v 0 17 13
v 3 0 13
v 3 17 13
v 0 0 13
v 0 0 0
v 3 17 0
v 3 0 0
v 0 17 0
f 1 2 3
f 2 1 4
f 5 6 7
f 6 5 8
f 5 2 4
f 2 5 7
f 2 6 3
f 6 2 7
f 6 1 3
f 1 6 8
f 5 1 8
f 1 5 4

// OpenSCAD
// Generated by SolidPython 1.0.1 on 2020-07-29 00:46:54


cube(size = [3, 17, 13]);
/***********************************************
*********      SolidPython code:      **********
************************************************
 
# import packages: SolidPython
from solid import *
from solid.utils import *
from itertools import chain, combinations, permutations


class Resize:

    def __init__(self, scad_file):
        self.scad_file = scad_file
        #self.scad_file = import_scad(scad_file)
        # cone/cylinder param:
        self.r1 = 0
        self.r2 = 0
        self.h = 0
        # rectangular prism param:
        self.w = 0
        self.l = 0
        # ellipse param:
        self.r = 0

    # import OpenScad code (file name corresponds to shape)


    # classify shape + parameters
    def assign(self, param1, param2, param3):
        if self.scad_file == 'cone.scad':
            self.r1 = param1
            self.r2 = param2
            self.h = param3
        elif self.scad_file == 'cylinder.scad':
            self.r1 = param1
            self.r2 = param2
            self.h = param3
        elif self.scad_file == 'rectangularPrism.scad':
            self.h = param1
            self.l = param2
            self.w = param3
        else:
            self.r = param1
            self.h = param2

    # resize parameters
    def iterate(self):
        x = range(3, 20, 2)
        i = 1
        if self.scad_file == 'cone.scad':
            tempList = list(permutations(x, 2))
            for temp in tempList:
                param1 = temp[0]
                param2 = temp[1]
                filepath = 'produced_scad_files/' + 'cone' + str(param1) + '_' + str(param2) + '_' + '.scad'
                scad_render_to_file(cylinder(h=param1, r1=param2, r2=0), filepath)

        elif self.scad_file == 'cylinder.scad':
            tempList = list(permutations(x, 3))
            for temp in tempList:
                param1 = temp[0]
                param2 = temp[1]
                filepath = 'produced_scad_files/' + 'cylinder' + str(param1) + '_' + str(param2) + '_' + '.scad'
                scad_render_to_file(cylinder(h=param1, r1=param2, r2=param2), filepath)

        elif self.scad_file == 'rectangularPrism.scad':
            tempList = list(permutations(x, 3))
            for temp in tempList:
                param1 = temp[0]
                param2 = temp[1]
                param3 = temp[2]
                filepath = 'produced_scad_files/' + 'rectangularPrism' + str(param1) + '_' + str(param2) + '_' + str(
                    param3) + '.scad'
                scad_render_to_file(cube(size=(param1, param2, param3)), filepath)

        elif self.scad_file == 'ellipse.scad':
            tempList = list(permutations(x, 4))
            for temp in tempList:
                param1 = temp[0]
                param2 = temp[1]
                param3 = temp[2]
                param4 = temp[3]
                filepath = 'produced_scad_files/' + 'ellipse' + str(param1) + '_' + str(param2) + '_' + str(param3) + '_' + str(param4) + '.scad'
                scad_render_to_file(scale([param1, param2, param3])(sphere(r=param4)), filepath)

    def render_to_scadfile(self):
        scad_render_to_file(scad, 'example.scad') 
 
************************************************/
